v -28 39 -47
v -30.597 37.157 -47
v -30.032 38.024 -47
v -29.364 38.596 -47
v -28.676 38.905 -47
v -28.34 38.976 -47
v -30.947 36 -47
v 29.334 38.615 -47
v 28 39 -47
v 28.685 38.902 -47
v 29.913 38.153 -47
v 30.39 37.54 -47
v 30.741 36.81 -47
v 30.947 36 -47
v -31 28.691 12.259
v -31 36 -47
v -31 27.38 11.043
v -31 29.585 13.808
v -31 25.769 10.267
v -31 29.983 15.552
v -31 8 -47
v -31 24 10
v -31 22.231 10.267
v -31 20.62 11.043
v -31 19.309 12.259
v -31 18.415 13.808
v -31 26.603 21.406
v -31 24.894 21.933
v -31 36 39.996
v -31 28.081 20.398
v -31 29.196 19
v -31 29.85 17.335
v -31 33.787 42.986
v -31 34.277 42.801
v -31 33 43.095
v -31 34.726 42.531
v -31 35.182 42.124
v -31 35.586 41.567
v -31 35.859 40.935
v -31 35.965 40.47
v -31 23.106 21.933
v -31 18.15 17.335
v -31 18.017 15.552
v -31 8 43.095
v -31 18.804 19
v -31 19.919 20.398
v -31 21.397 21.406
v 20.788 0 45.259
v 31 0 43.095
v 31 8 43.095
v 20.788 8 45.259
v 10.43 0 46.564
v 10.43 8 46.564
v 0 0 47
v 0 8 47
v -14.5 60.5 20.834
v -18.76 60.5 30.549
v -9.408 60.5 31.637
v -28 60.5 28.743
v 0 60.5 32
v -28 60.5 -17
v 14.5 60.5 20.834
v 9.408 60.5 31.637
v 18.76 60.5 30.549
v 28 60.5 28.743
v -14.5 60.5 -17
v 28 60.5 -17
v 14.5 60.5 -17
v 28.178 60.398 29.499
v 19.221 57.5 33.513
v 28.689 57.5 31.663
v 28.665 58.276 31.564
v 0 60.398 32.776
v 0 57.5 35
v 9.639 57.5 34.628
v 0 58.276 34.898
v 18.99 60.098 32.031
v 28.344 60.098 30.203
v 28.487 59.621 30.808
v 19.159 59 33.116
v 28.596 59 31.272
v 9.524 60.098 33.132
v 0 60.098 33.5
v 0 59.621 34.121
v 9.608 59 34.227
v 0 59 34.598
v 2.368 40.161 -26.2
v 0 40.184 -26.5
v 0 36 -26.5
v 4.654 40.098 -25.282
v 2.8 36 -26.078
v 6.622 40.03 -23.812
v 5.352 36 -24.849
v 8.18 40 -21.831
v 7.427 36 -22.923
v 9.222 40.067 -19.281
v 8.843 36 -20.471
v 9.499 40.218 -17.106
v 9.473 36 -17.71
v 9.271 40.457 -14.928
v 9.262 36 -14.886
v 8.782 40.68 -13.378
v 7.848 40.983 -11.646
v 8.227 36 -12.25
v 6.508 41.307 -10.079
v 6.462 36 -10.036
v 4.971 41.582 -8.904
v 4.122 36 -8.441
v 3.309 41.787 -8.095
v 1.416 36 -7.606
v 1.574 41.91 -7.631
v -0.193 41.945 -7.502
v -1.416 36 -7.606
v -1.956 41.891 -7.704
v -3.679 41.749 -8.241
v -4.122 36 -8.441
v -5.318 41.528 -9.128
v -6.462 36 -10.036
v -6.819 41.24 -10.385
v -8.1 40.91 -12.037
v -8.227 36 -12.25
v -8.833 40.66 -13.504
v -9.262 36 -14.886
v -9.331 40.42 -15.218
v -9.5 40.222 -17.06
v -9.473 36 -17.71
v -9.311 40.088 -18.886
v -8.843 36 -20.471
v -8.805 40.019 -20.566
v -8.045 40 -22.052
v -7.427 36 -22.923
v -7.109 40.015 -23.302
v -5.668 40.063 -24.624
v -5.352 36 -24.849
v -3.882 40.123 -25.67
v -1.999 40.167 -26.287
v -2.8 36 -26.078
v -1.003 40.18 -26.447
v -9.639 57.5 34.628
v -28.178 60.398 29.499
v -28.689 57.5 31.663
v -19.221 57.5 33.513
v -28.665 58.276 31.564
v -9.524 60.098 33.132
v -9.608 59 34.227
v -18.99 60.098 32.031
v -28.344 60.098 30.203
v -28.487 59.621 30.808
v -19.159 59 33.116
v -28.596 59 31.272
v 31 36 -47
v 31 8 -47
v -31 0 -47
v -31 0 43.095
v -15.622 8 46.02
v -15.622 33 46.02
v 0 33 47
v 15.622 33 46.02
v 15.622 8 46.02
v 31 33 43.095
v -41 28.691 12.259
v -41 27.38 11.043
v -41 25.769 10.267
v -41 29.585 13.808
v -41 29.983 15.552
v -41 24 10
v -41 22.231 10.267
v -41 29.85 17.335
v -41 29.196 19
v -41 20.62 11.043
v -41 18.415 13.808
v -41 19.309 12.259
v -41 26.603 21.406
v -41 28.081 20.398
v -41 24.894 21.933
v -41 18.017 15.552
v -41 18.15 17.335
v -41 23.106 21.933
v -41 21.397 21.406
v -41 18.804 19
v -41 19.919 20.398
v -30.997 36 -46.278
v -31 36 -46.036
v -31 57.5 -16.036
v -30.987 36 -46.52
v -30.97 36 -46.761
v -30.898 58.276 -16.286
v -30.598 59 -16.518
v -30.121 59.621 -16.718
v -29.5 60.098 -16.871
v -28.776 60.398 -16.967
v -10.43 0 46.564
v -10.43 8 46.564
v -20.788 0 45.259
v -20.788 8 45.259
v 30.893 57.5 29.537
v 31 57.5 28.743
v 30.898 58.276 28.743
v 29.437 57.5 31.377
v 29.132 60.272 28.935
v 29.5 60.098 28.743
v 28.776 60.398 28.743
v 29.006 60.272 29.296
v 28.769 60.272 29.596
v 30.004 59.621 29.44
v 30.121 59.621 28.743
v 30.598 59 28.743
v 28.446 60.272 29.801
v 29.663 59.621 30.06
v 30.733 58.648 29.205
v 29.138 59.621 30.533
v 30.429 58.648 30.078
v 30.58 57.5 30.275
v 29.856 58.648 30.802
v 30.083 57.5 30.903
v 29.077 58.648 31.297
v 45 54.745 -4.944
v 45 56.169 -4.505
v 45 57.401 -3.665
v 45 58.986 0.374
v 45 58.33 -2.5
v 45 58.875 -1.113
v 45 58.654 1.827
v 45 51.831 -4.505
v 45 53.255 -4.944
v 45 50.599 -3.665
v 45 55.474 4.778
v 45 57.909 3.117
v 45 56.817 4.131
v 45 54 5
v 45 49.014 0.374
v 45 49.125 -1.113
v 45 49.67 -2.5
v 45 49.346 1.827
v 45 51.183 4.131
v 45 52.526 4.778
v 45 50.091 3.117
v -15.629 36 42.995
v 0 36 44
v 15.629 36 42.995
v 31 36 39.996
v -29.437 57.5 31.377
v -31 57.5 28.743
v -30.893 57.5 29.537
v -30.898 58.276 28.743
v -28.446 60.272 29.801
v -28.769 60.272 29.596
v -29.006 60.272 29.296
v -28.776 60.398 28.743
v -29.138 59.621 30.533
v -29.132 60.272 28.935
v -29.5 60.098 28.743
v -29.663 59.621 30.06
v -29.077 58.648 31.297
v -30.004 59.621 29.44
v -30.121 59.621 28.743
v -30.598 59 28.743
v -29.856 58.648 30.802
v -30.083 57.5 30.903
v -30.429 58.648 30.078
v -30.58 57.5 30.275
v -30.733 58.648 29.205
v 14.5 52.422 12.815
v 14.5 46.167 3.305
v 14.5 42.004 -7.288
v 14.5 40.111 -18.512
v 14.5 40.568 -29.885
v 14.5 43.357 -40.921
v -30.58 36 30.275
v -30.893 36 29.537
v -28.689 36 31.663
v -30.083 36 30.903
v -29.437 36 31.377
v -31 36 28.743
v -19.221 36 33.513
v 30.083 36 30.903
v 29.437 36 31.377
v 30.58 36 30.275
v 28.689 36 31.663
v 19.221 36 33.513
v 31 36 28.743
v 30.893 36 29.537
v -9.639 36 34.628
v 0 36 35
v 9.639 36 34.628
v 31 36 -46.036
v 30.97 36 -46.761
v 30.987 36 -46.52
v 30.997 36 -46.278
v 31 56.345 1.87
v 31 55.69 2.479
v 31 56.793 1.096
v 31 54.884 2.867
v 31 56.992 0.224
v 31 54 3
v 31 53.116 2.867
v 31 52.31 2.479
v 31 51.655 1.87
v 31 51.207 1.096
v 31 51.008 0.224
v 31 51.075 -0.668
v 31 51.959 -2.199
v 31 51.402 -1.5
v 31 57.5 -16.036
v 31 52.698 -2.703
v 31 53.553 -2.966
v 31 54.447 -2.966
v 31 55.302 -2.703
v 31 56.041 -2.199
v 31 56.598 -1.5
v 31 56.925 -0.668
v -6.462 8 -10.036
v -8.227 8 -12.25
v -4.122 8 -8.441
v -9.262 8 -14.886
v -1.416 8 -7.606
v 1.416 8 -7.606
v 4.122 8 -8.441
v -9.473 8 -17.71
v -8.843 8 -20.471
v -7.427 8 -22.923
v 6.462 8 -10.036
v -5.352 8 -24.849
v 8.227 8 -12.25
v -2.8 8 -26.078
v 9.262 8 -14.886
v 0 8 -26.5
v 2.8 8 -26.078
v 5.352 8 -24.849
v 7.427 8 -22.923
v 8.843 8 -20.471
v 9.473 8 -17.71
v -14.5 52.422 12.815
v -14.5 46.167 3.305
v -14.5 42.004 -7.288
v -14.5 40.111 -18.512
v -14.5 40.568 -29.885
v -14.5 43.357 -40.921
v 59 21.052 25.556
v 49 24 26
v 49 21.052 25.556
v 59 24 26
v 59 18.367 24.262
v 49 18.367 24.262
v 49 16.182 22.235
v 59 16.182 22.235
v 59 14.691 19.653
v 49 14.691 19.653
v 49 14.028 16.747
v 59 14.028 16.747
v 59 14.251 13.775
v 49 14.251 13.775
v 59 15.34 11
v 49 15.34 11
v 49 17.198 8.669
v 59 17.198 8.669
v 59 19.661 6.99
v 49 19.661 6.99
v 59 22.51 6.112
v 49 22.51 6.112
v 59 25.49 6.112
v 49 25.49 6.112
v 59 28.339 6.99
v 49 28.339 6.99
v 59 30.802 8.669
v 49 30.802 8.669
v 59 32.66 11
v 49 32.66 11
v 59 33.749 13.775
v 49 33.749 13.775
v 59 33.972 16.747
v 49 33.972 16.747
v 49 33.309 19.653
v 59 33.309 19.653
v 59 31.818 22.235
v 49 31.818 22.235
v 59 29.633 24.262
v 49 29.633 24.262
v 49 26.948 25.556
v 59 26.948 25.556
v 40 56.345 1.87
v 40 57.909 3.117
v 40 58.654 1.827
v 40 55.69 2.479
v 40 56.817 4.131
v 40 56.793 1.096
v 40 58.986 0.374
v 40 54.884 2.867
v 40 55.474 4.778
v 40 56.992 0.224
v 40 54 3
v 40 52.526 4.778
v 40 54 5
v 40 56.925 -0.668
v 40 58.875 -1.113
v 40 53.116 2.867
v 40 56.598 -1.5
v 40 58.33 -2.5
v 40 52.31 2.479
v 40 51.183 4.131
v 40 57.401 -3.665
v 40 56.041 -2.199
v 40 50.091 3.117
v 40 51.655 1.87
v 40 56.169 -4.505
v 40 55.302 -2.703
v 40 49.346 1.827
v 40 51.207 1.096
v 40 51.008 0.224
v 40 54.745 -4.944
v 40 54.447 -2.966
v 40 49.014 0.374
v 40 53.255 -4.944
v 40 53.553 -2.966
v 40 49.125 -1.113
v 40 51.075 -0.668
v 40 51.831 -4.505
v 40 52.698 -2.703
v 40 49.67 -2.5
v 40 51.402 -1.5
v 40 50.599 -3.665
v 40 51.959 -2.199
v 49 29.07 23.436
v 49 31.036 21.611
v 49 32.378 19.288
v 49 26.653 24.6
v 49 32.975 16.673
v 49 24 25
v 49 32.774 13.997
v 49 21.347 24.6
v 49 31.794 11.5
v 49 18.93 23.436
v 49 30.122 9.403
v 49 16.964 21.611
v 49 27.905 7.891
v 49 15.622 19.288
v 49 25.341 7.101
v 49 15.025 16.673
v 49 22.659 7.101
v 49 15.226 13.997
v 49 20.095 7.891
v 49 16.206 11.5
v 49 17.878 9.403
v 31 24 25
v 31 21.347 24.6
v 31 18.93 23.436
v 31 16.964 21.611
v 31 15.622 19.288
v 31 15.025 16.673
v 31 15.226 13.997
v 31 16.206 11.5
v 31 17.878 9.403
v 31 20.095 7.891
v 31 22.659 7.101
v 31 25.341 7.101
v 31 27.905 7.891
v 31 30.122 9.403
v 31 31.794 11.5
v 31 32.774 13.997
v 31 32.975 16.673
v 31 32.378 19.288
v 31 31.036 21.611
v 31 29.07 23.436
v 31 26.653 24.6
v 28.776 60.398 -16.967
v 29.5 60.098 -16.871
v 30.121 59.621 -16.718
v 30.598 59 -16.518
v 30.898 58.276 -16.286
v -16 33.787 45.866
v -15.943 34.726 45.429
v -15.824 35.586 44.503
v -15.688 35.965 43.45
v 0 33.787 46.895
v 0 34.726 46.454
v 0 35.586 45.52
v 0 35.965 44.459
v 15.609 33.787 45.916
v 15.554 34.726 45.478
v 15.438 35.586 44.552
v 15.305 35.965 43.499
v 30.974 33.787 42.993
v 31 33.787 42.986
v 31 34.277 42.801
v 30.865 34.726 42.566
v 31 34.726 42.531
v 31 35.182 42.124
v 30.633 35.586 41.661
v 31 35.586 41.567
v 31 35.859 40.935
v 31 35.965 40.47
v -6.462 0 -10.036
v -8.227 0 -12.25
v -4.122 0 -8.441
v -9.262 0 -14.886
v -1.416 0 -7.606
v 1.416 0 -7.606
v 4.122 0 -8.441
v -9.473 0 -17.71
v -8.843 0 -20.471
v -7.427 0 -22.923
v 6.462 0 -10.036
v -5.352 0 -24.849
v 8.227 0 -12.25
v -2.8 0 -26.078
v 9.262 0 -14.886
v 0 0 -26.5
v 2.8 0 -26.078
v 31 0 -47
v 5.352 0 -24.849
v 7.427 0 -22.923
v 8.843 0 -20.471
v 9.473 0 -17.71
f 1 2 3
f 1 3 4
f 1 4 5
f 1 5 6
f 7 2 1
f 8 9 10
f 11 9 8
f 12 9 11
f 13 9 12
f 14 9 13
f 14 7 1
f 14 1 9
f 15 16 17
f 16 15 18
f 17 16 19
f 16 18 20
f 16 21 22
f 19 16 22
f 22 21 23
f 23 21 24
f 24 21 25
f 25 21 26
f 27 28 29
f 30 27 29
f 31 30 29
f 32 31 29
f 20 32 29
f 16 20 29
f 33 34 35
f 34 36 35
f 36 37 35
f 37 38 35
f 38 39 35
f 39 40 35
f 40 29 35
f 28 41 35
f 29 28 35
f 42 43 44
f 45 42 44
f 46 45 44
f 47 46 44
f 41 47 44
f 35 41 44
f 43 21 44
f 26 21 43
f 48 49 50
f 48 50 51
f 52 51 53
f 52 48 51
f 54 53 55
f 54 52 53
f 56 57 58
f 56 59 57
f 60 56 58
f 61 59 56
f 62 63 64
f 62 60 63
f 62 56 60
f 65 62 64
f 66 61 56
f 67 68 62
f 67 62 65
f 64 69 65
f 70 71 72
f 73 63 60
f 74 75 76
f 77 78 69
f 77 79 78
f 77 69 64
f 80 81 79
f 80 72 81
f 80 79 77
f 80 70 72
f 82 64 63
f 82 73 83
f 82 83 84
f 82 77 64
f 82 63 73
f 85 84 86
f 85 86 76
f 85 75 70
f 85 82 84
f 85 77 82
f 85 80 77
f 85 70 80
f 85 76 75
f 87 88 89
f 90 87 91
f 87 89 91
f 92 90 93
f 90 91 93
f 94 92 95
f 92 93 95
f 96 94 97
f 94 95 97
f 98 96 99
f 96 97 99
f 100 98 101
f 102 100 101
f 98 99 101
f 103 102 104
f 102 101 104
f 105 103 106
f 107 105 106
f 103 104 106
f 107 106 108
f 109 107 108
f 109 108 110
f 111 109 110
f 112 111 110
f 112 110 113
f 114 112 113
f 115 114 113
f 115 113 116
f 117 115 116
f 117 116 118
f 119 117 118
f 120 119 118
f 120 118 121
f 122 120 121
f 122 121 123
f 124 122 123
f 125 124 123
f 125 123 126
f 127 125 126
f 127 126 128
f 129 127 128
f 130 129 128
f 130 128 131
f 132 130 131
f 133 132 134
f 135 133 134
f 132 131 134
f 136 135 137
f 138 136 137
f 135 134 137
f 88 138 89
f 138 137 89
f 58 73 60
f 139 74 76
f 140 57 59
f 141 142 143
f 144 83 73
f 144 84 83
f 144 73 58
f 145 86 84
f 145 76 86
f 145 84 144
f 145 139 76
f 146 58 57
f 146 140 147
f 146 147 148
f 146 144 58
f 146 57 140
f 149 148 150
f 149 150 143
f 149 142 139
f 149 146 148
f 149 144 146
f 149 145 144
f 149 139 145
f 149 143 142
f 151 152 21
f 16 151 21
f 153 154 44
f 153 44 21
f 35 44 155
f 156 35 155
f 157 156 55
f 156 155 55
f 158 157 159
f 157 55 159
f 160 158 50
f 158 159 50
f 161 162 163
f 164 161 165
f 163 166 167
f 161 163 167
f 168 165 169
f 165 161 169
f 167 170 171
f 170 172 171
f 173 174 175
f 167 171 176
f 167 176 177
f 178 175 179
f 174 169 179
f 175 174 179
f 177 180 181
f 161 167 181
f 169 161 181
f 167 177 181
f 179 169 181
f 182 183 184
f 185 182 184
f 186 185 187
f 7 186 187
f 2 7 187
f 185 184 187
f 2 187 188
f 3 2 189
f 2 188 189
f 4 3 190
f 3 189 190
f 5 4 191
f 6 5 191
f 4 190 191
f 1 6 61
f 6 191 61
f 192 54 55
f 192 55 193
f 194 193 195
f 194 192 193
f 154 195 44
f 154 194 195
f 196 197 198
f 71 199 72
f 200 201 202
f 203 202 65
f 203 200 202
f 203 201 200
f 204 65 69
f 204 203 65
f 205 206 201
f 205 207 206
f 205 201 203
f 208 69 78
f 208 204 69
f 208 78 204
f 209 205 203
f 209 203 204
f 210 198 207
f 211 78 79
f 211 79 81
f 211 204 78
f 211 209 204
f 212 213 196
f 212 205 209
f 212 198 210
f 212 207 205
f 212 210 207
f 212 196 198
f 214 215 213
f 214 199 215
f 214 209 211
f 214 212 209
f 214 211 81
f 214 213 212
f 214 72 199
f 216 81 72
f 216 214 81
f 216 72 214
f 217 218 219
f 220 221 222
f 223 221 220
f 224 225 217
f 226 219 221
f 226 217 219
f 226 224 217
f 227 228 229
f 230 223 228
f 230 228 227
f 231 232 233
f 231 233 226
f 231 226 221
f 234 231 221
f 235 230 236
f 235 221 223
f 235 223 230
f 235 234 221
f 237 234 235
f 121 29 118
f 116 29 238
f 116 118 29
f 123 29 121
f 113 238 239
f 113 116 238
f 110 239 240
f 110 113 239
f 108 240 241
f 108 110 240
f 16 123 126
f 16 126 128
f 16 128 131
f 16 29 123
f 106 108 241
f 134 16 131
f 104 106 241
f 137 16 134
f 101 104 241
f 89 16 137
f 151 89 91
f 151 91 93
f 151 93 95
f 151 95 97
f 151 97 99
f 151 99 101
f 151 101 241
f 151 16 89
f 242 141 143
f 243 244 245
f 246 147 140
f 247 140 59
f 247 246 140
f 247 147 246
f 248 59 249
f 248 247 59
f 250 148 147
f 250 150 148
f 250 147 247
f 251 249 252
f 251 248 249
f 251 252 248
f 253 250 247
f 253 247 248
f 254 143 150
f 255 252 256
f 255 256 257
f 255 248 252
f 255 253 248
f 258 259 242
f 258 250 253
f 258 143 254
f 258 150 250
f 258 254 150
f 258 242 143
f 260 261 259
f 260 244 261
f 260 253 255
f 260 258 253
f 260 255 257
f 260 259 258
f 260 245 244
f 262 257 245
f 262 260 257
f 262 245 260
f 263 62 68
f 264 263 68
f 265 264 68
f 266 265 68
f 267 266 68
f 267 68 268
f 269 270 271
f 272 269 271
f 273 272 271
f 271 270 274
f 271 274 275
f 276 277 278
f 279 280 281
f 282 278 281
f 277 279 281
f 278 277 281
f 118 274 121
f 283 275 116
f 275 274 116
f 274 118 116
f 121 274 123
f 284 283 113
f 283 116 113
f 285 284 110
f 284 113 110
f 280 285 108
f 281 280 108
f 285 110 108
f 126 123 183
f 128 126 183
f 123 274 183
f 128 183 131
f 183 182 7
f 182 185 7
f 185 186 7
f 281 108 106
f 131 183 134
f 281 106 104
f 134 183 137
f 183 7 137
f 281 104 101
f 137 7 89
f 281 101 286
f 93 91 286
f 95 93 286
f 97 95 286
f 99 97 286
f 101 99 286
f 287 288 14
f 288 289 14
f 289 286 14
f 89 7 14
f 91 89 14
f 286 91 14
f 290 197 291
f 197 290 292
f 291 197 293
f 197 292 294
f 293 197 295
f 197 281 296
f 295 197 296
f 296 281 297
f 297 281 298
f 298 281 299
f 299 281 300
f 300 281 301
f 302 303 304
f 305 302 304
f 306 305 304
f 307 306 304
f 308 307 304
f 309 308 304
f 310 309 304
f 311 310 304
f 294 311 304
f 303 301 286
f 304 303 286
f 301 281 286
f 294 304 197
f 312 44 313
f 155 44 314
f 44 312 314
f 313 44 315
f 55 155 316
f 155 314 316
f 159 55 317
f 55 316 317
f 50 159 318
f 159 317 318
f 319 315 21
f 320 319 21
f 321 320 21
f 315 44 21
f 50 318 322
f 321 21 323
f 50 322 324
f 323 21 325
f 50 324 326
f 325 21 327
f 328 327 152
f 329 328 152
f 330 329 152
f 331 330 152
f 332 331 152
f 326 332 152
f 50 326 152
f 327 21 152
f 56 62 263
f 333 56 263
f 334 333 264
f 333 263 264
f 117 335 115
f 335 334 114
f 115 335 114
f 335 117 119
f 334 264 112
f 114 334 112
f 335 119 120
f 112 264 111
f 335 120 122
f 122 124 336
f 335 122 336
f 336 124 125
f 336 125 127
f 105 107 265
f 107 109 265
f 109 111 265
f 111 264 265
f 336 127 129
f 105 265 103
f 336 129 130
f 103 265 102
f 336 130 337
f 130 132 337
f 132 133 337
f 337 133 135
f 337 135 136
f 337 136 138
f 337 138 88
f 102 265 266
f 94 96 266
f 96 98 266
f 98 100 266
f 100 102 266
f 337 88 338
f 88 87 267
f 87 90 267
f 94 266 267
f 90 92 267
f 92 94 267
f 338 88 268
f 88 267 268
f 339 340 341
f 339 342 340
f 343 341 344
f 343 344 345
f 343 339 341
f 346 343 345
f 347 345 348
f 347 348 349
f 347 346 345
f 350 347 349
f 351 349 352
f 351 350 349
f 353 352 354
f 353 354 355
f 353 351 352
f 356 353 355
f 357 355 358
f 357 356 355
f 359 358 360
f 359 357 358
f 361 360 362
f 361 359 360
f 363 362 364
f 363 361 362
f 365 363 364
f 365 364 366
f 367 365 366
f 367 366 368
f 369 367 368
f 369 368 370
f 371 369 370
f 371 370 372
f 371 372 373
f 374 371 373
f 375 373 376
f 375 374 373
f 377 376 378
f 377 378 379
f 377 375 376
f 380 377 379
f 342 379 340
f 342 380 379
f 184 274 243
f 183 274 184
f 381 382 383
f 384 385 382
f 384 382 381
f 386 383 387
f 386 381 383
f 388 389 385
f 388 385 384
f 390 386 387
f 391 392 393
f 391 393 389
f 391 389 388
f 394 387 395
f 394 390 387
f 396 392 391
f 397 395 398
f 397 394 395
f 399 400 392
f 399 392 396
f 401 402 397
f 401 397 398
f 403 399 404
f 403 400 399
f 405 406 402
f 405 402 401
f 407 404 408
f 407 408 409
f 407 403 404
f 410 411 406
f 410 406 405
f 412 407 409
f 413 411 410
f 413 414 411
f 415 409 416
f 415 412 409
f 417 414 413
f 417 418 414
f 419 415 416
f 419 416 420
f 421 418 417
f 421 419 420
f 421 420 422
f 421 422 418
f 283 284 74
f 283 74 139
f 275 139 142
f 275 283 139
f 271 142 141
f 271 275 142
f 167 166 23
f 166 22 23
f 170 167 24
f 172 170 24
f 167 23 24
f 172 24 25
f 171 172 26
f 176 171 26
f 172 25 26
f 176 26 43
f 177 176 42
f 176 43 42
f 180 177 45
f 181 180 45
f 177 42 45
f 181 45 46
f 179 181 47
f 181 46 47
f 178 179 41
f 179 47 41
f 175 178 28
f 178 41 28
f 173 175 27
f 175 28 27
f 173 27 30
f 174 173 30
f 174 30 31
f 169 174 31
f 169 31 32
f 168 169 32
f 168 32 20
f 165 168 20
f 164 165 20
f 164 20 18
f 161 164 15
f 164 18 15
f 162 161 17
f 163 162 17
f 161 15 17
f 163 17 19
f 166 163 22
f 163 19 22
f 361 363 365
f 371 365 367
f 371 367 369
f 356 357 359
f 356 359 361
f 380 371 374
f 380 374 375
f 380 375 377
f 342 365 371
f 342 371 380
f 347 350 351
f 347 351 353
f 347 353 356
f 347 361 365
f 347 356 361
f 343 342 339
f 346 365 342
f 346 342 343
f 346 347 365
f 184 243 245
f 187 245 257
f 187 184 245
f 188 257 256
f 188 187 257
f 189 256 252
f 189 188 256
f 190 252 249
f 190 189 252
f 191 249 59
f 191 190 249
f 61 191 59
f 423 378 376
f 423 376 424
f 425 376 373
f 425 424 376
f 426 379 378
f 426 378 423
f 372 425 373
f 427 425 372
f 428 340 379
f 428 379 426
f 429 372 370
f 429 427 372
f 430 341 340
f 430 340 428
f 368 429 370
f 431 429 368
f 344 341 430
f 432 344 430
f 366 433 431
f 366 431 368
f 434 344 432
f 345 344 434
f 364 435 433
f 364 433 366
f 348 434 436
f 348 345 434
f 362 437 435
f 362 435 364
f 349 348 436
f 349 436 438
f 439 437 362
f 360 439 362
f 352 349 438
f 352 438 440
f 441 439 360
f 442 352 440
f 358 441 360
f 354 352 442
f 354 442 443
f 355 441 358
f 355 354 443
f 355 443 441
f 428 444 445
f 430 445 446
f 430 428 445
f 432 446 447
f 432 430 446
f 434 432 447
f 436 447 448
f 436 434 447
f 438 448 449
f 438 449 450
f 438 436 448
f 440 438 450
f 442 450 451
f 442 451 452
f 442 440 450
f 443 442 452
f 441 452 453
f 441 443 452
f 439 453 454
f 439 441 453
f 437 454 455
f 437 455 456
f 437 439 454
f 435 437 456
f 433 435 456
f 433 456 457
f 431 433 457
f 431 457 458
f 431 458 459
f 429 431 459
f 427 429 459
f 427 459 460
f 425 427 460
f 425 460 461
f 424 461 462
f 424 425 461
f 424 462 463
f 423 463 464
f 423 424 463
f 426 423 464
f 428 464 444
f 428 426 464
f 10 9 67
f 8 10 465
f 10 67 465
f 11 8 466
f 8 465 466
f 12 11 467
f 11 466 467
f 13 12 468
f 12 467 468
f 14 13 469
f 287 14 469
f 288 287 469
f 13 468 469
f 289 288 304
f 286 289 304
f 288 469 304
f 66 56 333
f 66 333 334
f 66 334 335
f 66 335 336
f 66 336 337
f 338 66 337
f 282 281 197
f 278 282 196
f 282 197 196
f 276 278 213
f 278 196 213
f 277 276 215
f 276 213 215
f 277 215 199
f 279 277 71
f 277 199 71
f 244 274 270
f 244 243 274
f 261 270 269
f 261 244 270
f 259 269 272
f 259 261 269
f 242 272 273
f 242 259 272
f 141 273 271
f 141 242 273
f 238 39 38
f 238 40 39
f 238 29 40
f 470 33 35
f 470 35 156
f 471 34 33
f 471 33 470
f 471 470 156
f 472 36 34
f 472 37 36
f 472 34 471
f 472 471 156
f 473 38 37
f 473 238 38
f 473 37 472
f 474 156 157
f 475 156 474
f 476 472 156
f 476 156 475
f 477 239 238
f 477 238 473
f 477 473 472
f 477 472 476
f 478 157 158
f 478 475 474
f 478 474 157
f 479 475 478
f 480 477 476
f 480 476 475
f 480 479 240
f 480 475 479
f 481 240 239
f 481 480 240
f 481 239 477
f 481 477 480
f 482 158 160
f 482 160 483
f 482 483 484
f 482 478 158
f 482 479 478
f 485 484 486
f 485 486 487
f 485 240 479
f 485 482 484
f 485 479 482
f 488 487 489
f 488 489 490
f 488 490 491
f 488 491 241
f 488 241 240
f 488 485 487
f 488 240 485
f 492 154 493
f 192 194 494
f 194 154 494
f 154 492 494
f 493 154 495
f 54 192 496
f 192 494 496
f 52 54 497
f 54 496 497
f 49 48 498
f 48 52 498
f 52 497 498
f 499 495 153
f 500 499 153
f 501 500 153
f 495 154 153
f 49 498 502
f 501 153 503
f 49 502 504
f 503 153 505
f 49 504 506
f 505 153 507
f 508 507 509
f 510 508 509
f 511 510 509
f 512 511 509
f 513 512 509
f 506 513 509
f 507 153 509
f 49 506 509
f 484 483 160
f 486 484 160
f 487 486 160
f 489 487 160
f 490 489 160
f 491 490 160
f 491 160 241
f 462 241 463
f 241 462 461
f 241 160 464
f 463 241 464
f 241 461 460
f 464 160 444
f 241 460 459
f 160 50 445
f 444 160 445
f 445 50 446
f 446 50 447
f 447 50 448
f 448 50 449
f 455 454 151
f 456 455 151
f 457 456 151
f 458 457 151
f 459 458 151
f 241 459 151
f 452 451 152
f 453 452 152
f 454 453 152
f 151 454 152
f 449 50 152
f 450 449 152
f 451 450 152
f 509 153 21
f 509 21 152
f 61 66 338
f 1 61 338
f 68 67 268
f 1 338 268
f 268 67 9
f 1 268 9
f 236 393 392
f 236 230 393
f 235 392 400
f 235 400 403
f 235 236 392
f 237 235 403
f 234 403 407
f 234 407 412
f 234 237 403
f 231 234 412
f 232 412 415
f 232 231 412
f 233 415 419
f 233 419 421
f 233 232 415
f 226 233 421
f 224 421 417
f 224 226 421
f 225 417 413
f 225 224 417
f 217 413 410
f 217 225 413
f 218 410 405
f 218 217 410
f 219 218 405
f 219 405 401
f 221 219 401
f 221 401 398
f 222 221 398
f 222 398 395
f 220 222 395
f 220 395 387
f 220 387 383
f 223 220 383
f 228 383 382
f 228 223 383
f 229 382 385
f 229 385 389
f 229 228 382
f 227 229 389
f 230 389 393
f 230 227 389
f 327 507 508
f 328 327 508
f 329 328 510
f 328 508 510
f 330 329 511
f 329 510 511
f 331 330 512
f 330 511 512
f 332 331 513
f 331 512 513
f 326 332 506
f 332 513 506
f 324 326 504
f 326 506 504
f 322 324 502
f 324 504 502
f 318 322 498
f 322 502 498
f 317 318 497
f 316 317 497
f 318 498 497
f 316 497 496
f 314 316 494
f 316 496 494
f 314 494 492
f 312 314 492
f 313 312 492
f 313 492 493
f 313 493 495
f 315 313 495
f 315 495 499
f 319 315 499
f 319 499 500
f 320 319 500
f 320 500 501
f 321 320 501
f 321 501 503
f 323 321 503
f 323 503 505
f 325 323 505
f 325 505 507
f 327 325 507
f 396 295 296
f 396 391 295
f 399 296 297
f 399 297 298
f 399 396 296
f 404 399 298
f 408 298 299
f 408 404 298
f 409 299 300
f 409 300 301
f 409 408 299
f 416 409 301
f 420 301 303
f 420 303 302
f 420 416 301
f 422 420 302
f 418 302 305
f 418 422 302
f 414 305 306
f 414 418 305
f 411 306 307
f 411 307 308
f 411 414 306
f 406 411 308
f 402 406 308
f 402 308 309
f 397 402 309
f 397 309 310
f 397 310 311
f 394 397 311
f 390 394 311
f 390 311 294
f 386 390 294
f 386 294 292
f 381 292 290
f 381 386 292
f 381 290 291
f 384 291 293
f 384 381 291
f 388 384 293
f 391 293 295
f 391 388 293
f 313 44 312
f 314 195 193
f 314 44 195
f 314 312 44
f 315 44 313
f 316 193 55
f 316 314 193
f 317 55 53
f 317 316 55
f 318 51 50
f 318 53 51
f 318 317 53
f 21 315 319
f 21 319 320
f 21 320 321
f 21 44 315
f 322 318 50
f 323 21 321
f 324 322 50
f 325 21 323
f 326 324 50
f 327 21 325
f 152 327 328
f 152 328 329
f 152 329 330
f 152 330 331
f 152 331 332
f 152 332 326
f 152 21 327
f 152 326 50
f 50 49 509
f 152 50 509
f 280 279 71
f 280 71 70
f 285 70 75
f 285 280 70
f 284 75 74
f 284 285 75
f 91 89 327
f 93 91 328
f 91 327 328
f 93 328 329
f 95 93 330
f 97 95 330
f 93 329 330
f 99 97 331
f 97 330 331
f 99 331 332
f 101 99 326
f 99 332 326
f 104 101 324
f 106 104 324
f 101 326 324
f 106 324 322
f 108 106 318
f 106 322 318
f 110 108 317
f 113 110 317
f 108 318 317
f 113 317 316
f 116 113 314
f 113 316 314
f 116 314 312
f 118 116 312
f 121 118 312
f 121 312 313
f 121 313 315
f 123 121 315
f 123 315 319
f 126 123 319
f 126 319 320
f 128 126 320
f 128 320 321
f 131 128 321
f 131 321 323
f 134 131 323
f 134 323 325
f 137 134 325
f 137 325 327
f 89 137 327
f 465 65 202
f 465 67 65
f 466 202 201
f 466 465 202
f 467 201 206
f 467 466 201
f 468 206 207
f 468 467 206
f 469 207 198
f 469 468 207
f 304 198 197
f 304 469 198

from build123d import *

# Parameters (mm, degrees)
SKIZZE1_W                       = 62
SKIZZE1_H                       = 94
AUFSATZ_LINEAR_AUSTRAGEN1_DEPTH = 8
SCHNITT_LINEAR_START            = -8
SCHNITT_LINEAR_AUSTRAGEN1_DEPTH = 8
AUFSATZ_LINEAR_AUSTRAGEN2_DEPTH = 28
SKIZZE4_W                       = 62
SKIZZE4_H                       = 82
AUFSATZ_LINEAR_AUSTRAGEN3_DEPTH = 24.5
SCHNITT_LINEAR_START_2          = -24.5
SCHNITT_LINEAR_AUSTRAGEN2_DEPTH = 24.5
SCHNITT_LINEAR_AUSTRAGEN3_DEPTH = 32.25
SKIZZE7_R                       = 55
SCHNITT_LINEAR_AUSTRAGEN4_DEPTH = 14.5
VERRUNDUNG1_R                   = 3
VERRUNDUNG2_R                   = 3
SKIZZE12_W                      = 10
SKIZZE12_H                      = 6
SKIZZE14_R                      = 9.5
SCHNITT_LINEAR_AUSTRAGEN5_DEPTH = 97.696690788


# Read off the part's stored shape, not the designer's step: Schnitt-Linear austragen1, Schnitt-Linear austragen2
with BuildPart() as part:
    # Skizze1 → Aufsatz-Linear austragen1 (new body)
    with BuildSketch(Plane(origin=(0, 0, 0), x_dir=(1, 0, 0), z_dir=(0, 1, 0))):
        Rectangle(SKIZZE1_W, SKIZZE1_H)
    extrude(amount=AUFSATZ_LINEAR_AUSTRAGEN1_DEPTH)

    # Schnitt-Linear austragen1 outline → Schnitt-Linear austragen1 (cut)
    with BuildSketch(Plane(origin=(0, 8, 0), x_dir=(1, 0, 0), z_dir=(0, 1, 0)).offset(SCHNITT_LINEAR_START)):
        with BuildLine():
            ThreePointArc((31, -43.095004026), (15.622491747, -46.019908691), (0, -47))
            Line((0, -47), (31, -47))
            Line((31, -47), (31, -43.095004026))
        make_face()
        with BuildLine():
            ThreePointArc((0, -47), (-15.622491747, -46.019908691), (-31, -43.095004026))
            Line((-31, -43.095004026), (-31, -47))
            Line((-31, -47), (0, -47))
        make_face()
    extrude(amount=SCHNITT_LINEAR_AUSTRAGEN1_DEPTH, mode=Mode.SUBTRACT)


with BuildPart() as body_2:
    # Skizze3 → Aufsatz-Linear austragen2 (new body)
    with BuildSketch(Plane(origin=(0, 8, 0), x_dir=(1, 0, 0), z_dir=(0, 1, 0))):
        with BuildLine():
            Line((-31, 47), (-31, -43.095004026))
            ThreePointArc((-31, -43.095004026), (0, -47), (31, -43.095004026))
            Line((31, -43.095004026), (31, 47))
            Line((31, 47), (-31, 47))
        make_face()
    extrude(amount=AUFSATZ_LINEAR_AUSTRAGEN2_DEPTH)

    # Verrundung1
    verrundung1_edges = [body_2.edges().sort_by_distance(p)[0] for p in [
        (0, 36, 47),
    ]]
    fillet(verrundung1_edges, radius=VERRUNDUNG1_R)

    # Skizze11 → Rotation2 (revolve)
    with BuildSketch(Plane.XY.offset(16), mode=Mode.PRIVATE) as rotation2_sk:
        Polygon((31, 24), (31, 33), (49, 33), (49, 34), (59, 34), (59, 24), align=None)
    revolve(rotation2_sk.sketch.rotate(Axis((4.559824511, 24, 16), (1, 0, 0)), 90), axis=Axis((4.559824511, 24, 16), (1, 0, 0)))

    # Skizze12 → Rotation3 (revolve)
    with BuildSketch(Plane.XY.offset(16), mode=Mode.PRIVATE) as rotation3_sk:
        with Locations((-36, 27)):
            Rectangle(SKIZZE12_W, SKIZZE12_H)
    revolve(rotation3_sk.sketch.rotate(Axis((-5.61653293, 24, 16), (-1, 0, 0)), 90), axis=Axis((-5.61653293, 24, 16), (-1, 0, 0)))


with BuildPart() as body_3:
    # Skizze4 → Aufsatz-Linear austragen3 (new body)
    with BuildSketch(Plane(origin=(0, 36, 0), x_dir=(1, 0, 0), z_dir=(0, 1, 0))):
        with Locations((0, 6)):
            Rectangle(SKIZZE4_W, SKIZZE4_H)
    extrude(amount=AUFSATZ_LINEAR_AUSTRAGEN3_DEPTH)

    # Schnitt-Linear austragen2 outline → Schnitt-Linear austragen2 (cut)
    with BuildSketch(Plane(origin=(0, 60.5, 0), x_dir=(1, 0, 0), z_dir=(0, 1, 0)).offset(SCHNITT_LINEAR_START_2)):
        with BuildLine():
            ThreePointArc((31, -31.095004026), (15.622491747, -34.019908691), (0, -35))
            Line((0, -35), (31, -35))
            Line((31, -35), (31, -31.095004026))
        make_face()
        with BuildLine():
            ThreePointArc((0, -35), (-15.622491747, -34.019908691), (-31, -31.095004026))
            Line((-31, -31.095004026), (-31, -35))
            Line((-31, -35), (0, -35))
        make_face()
    extrude(amount=SCHNITT_LINEAR_AUSTRAGEN2_DEPTH, mode=Mode.SUBTRACT)

    # Skizze6 → Schnitt-Linear austragen3 (cut, symmetric)
    with BuildSketch(Plane(origin=(0, 0, 0), x_dir=(0, 0, -1), z_dir=(1, 0, 0))):
        Polygon((47, 60.5), (17, 60.5), (47, 39), align=None)
    extrude(amount=SCHNITT_LINEAR_AUSTRAGEN3_DEPTH, both=True, mode=Mode.SUBTRACT)

    # Skizze7 → Schnitt-Linear austragen4 (cut, symmetric)
    with BuildSketch(Plane(origin=(0, 0, 0), x_dir=(0, 0, -1), z_dir=(1, 0, 0))):
        with Locations((22, 95)):
            Circle(SKIZZE7_R)
    extrude(amount=SCHNITT_LINEAR_AUSTRAGEN4_DEPTH, both=True, mode=Mode.SUBTRACT)

    # Verrundung2
    verrundung2_edges = [body_3.edges().sort_by_distance(p)[0] for p in [
        (-31, 49.75, -32),
        (31, 49.75, -32),
        (31, 60.5, 7.047502013),
        (-15.622491747, 60.5, 34.019908691),
        (-31, 60.5, 7.047502013),
        (-31, 48.25, 31.095004026),
        (31, 48.25, 31.095004026),
    ]]
    fillet(verrundung2_edges, radius=VERRUNDUNG2_R)

    # Skizze10 → Rotation1 (revolve)
    with BuildSketch(Plane.XY, mode=Mode.PRIVATE) as rotation1_sk:
        Polygon((31, 54), (31, 57), (40, 57), (40, 59), (45, 59), (45, 54), align=None)
    revolve(rotation1_sk.sketch.rotate(Axis((12.139432052, 54, 0), (1, 0, 0)), 90), axis=Axis((12.139432052, 54, 0), (1, 0, 0)))


with BuildPart() as schnitt_linear_austragen5_tool:
    # Skizze14 → Schnitt-Linear austragen5 (new, through all)
    with BuildSketch(Plane.XZ):
        with Locations(Location((0, -17, 0), (0, 0, 270))):
            Circle(SKIZZE14_R)
    extrude(amount=-SCHNITT_LINEAR_AUSTRAGEN5_DEPTH)


with BuildPart() as part_1:
    add(part.part)

    # Schnitt-Linear austragen5: cut by schnitt_linear_austragen5_tool
    add(schnitt_linear_austragen5_tool.part, mode=Mode.SUBTRACT)


with BuildPart() as body_2_1:
    add(body_2.part)

    # Schnitt-Linear austragen5: cut by schnitt_linear_austragen5_tool
    add(schnitt_linear_austragen5_tool.part, mode=Mode.SUBTRACT)


with BuildPart() as body_3_1:
    add(body_3.part)

    # Schnitt-Linear austragen5: cut by schnitt_linear_austragen5_tool
    add(schnitt_linear_austragen5_tool.part, mode=Mode.SUBTRACT)


solid = Compound([part_1.part, body_2_1.part, body_3_1.part])
